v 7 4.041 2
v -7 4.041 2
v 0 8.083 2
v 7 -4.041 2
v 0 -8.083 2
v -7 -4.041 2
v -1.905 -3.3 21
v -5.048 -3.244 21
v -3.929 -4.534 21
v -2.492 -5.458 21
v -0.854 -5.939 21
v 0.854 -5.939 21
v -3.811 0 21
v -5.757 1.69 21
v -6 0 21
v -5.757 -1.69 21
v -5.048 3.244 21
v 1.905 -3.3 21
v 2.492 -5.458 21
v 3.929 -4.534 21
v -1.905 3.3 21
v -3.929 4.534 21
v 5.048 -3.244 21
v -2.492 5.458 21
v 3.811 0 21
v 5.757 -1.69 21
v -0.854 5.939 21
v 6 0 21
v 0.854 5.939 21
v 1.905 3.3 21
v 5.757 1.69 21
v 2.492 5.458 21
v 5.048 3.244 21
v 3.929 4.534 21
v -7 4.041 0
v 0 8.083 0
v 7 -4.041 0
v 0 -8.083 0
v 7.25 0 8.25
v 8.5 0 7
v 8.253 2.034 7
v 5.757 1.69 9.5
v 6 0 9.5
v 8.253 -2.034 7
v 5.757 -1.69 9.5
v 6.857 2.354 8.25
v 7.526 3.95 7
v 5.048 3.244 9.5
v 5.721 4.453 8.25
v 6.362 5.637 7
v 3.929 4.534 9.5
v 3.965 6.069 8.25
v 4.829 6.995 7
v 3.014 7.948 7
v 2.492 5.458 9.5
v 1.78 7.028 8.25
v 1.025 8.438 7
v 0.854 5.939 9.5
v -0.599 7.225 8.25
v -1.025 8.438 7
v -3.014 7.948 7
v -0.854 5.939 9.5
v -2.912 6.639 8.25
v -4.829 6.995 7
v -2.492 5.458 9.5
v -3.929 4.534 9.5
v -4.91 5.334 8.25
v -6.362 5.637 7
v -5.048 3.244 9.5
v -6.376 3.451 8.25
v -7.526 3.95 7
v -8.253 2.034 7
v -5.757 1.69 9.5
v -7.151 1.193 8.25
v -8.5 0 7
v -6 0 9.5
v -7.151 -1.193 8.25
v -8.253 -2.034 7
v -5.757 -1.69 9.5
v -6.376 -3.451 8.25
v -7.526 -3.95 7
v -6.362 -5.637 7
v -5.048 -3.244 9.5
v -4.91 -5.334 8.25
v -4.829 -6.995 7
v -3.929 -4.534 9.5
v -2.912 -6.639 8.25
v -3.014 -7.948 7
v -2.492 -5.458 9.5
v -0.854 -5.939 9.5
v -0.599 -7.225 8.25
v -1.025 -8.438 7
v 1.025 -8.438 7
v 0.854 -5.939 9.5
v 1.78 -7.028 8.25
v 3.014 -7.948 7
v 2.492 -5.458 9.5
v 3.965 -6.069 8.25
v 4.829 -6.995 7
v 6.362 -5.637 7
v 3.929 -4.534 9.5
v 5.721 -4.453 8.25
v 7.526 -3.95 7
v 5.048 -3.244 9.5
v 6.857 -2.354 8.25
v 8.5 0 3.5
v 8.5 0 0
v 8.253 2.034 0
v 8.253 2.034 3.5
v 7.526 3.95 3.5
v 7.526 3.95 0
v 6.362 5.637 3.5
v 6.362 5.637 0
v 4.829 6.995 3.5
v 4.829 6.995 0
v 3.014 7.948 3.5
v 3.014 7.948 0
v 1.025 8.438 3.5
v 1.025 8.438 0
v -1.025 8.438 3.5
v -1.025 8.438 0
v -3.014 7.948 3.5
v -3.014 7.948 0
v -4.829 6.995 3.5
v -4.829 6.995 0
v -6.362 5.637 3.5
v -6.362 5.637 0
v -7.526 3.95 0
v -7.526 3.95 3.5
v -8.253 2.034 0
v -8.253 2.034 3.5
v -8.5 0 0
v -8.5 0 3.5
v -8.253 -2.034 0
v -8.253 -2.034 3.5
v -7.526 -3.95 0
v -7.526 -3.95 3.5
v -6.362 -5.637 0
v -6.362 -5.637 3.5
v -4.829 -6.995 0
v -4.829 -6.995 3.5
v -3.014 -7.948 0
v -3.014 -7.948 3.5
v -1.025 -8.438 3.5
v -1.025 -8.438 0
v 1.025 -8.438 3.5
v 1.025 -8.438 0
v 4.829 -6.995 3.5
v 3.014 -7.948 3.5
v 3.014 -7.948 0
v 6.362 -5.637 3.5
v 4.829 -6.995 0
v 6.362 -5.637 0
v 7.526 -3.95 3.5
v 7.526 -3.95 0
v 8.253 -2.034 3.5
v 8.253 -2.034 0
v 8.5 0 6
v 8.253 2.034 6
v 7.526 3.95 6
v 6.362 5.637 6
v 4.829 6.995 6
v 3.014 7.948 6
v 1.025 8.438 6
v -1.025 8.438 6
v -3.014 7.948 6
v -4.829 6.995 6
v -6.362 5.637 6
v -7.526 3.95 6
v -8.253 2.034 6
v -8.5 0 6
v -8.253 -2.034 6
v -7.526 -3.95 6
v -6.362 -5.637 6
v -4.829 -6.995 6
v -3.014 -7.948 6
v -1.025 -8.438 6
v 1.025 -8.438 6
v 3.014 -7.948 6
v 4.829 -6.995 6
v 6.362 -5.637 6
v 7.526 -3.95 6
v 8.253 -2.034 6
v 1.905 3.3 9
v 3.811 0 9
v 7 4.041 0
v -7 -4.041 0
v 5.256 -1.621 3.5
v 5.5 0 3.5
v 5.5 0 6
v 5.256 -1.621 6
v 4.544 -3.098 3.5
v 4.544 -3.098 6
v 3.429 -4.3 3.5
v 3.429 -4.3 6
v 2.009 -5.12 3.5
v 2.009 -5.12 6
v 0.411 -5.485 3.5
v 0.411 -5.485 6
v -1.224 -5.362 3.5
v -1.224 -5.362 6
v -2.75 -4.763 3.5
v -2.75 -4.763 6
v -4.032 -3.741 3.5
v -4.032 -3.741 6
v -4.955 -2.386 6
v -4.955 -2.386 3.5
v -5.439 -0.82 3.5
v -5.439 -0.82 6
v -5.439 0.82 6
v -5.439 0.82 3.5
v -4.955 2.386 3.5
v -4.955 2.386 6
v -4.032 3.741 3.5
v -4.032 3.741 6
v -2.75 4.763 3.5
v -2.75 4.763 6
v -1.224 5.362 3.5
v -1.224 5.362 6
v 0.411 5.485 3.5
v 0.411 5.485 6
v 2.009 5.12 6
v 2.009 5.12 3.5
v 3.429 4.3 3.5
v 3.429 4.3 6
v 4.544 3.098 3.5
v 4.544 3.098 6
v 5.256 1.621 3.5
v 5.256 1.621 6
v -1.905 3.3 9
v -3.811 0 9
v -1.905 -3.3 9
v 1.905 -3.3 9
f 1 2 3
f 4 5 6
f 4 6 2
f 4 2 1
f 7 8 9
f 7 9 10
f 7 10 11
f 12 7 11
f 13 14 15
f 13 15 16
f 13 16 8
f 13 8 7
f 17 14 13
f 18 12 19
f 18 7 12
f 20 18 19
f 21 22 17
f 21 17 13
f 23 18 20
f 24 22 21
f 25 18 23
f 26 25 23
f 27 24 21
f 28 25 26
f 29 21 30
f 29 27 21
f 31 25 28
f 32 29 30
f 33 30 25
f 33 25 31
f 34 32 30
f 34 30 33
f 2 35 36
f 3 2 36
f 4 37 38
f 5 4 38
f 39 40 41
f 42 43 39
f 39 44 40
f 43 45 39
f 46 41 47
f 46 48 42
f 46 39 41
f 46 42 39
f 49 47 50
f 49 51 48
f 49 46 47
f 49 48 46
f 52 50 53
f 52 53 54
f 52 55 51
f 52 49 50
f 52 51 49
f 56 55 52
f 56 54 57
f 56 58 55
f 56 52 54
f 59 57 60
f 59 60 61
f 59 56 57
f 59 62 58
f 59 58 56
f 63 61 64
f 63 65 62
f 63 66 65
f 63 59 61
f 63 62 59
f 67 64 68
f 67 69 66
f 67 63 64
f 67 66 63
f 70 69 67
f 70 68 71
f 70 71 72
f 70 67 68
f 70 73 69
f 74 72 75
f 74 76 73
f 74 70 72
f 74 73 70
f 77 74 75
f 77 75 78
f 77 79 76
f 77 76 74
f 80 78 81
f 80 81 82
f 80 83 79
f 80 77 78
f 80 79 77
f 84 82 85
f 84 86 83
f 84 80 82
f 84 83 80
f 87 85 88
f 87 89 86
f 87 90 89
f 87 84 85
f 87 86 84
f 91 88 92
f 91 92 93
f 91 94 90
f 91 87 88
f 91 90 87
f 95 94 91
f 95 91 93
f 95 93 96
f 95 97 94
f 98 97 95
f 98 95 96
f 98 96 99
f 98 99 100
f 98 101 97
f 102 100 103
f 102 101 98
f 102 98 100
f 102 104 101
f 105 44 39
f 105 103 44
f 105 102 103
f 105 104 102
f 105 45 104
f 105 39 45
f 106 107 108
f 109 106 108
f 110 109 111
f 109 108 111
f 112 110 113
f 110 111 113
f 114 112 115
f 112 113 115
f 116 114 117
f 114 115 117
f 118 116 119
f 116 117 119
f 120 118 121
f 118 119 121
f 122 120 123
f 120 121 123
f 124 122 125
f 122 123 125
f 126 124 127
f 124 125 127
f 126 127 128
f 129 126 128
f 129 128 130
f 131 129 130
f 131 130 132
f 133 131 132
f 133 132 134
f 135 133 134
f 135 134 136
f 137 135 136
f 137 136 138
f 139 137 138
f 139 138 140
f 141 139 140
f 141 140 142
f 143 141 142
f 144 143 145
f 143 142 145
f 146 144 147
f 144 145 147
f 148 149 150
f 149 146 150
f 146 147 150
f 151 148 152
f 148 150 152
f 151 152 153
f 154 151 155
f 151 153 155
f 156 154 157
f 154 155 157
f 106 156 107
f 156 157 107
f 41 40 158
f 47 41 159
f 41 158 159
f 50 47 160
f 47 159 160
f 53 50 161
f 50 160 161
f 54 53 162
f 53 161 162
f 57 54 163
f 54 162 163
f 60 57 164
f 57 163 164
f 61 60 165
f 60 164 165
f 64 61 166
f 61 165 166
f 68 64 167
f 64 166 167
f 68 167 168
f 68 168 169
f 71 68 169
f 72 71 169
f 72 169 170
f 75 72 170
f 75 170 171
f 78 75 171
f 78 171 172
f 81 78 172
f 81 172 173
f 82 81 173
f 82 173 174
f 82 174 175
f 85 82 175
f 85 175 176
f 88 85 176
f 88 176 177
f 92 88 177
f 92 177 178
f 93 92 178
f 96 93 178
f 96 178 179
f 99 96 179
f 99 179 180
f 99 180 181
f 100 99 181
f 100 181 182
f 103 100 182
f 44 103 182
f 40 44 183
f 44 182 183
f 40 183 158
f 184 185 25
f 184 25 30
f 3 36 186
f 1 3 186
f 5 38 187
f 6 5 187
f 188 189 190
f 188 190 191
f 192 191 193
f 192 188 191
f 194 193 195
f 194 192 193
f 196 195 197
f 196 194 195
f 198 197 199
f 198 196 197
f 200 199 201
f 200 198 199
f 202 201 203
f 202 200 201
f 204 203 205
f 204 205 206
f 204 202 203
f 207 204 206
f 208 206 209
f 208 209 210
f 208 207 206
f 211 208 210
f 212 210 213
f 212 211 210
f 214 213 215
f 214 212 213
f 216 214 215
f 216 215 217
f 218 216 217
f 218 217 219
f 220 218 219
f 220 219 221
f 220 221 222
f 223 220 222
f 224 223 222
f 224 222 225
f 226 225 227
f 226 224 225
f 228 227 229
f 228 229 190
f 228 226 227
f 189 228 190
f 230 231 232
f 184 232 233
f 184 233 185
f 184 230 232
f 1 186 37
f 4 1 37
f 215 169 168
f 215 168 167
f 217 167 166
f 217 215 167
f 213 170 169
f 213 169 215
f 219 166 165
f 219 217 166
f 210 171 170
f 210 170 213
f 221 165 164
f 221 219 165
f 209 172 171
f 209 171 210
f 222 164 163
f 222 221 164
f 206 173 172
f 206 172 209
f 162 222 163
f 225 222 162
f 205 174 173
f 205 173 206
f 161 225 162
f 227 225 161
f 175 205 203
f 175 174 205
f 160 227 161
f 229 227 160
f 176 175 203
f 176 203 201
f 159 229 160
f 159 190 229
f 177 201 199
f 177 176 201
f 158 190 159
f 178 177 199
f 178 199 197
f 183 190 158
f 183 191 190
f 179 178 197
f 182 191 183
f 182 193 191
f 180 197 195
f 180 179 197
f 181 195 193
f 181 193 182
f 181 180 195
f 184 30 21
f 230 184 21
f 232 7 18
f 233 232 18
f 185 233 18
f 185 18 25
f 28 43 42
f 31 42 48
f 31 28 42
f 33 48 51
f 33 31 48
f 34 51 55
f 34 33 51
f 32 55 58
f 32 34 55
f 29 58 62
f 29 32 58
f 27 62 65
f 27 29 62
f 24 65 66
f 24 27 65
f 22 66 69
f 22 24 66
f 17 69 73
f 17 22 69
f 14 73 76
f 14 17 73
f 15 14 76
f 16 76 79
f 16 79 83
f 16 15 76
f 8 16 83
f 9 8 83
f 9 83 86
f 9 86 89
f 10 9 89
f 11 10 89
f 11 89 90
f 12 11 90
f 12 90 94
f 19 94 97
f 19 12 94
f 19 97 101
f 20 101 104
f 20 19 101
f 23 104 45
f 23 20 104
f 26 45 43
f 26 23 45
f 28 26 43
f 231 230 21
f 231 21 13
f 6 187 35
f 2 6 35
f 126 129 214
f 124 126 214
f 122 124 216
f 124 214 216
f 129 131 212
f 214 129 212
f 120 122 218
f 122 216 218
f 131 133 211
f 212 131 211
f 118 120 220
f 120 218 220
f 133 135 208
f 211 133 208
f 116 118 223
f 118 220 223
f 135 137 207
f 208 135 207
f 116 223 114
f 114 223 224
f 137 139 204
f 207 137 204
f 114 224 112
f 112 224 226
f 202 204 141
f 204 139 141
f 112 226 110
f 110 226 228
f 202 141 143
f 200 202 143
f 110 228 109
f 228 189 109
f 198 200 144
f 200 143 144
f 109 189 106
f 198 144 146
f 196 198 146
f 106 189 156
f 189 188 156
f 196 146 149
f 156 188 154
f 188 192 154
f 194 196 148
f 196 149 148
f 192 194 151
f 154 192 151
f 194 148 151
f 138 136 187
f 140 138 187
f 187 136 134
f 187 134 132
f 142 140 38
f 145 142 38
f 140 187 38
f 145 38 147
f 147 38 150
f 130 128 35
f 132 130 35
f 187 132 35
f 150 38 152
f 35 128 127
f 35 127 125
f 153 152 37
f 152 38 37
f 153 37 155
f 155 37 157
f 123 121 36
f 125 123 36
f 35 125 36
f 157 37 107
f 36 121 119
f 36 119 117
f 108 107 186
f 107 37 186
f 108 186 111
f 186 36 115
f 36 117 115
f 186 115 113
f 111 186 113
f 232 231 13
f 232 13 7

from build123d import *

# Parameters (mm, degrees)
F0_R        = 8.5
F1_DEPTH    = 11
F3_DEPTH    = 2
F5_R        = 8.5
F5_R_2      = 5.5
F6_DEPTH    = 2.5
F7_R        = 6
F8_DEPTH    = 10
F9_S5_R     = 6
F9_T6_DEPTH = 14
F11_DEPTH   = 12


# Not quite as in the source:
# - a fillet or chamfer that OpenCascade refuses, or shapes differently, is made with other operations: its cross-section is extruded or revolved along the edge and cut away or added


with BuildPart() as f1:
    # F0 (on Top) → F1 (new body)
    with BuildSketch(Plane.XY):
        Circle(F0_R)
    extrude(amount=F1_DEPTH)

    # F2 (on face) → F3 (cut)
    with BuildSketch(Plane(origin=(0, 0, 0), x_dir=(1, 0, 0), z_dir=(0, 0, -1))):
        Polygon((7, 4.0414518843), (0, 8.0829037687), (-7, 4.0414518843), (-7, -4.0414518843), (0, -8.0829037687), (7, -4.0414518843), align=None)
    extrude(amount=-F3_DEPTH, mode=Mode.SUBTRACT)

    # F5 (on offset) → F6 (cut)
    with BuildSketch(Plane(origin=(0, 0, 3.5), x_dir=(1, 0, 0), z_dir=(0, 0, -1))):
        Circle(F5_R)
        Circle(F5_R_2, mode=Mode.SUBTRACT)
    extrude(amount=-F6_DEPTH, mode=Mode.SUBTRACT)

    # F7 (on face) → F8 (join)
    with BuildSketch(Plane.XY.offset(11)):
        Circle(F7_R)
    extrude(amount=F8_DEPTH)

    # F9: chamfer of 4 on 1 edges, made by hand


with BuildPart() as f9_tool2:
    # F9_s3 → F9_t4 (revolve)
    with BuildSketch(Plane.XZ):
        Polygon((8.5, 7), (4.5, 11), (8.5, 11), align=None)
    revolve(axis=Axis((0, 0, 11), (0, 0, 1)))

    # F9_s5 → F9_t6 (cut, symmetric)
    with BuildSketch(Plane.XY.offset(9)):
        Circle(F9_S5_R)
    extrude(amount=F9_T6_DEPTH, both=True, mode=Mode.SUBTRACT)


with BuildPart() as f1_1:
    add(f1.part)

    # F9_t1: cut F9_tool2
    add(f9_tool2.part, mode=Mode.SUBTRACT)

    # F10 (on face) → F11 (cut)
    with BuildSketch(Plane.XY.offset(21)):
        Polygon((3.8105117767, 0), (1.9052558883, 3.3), (-1.9052558883, 3.3), (-3.8105117767, 0), (-1.9052558883, -3.3), (1.9052558883, -3.3), align=None)
    extrude(amount=-F11_DEPTH, mode=Mode.SUBTRACT)


solid = f1_1.part
